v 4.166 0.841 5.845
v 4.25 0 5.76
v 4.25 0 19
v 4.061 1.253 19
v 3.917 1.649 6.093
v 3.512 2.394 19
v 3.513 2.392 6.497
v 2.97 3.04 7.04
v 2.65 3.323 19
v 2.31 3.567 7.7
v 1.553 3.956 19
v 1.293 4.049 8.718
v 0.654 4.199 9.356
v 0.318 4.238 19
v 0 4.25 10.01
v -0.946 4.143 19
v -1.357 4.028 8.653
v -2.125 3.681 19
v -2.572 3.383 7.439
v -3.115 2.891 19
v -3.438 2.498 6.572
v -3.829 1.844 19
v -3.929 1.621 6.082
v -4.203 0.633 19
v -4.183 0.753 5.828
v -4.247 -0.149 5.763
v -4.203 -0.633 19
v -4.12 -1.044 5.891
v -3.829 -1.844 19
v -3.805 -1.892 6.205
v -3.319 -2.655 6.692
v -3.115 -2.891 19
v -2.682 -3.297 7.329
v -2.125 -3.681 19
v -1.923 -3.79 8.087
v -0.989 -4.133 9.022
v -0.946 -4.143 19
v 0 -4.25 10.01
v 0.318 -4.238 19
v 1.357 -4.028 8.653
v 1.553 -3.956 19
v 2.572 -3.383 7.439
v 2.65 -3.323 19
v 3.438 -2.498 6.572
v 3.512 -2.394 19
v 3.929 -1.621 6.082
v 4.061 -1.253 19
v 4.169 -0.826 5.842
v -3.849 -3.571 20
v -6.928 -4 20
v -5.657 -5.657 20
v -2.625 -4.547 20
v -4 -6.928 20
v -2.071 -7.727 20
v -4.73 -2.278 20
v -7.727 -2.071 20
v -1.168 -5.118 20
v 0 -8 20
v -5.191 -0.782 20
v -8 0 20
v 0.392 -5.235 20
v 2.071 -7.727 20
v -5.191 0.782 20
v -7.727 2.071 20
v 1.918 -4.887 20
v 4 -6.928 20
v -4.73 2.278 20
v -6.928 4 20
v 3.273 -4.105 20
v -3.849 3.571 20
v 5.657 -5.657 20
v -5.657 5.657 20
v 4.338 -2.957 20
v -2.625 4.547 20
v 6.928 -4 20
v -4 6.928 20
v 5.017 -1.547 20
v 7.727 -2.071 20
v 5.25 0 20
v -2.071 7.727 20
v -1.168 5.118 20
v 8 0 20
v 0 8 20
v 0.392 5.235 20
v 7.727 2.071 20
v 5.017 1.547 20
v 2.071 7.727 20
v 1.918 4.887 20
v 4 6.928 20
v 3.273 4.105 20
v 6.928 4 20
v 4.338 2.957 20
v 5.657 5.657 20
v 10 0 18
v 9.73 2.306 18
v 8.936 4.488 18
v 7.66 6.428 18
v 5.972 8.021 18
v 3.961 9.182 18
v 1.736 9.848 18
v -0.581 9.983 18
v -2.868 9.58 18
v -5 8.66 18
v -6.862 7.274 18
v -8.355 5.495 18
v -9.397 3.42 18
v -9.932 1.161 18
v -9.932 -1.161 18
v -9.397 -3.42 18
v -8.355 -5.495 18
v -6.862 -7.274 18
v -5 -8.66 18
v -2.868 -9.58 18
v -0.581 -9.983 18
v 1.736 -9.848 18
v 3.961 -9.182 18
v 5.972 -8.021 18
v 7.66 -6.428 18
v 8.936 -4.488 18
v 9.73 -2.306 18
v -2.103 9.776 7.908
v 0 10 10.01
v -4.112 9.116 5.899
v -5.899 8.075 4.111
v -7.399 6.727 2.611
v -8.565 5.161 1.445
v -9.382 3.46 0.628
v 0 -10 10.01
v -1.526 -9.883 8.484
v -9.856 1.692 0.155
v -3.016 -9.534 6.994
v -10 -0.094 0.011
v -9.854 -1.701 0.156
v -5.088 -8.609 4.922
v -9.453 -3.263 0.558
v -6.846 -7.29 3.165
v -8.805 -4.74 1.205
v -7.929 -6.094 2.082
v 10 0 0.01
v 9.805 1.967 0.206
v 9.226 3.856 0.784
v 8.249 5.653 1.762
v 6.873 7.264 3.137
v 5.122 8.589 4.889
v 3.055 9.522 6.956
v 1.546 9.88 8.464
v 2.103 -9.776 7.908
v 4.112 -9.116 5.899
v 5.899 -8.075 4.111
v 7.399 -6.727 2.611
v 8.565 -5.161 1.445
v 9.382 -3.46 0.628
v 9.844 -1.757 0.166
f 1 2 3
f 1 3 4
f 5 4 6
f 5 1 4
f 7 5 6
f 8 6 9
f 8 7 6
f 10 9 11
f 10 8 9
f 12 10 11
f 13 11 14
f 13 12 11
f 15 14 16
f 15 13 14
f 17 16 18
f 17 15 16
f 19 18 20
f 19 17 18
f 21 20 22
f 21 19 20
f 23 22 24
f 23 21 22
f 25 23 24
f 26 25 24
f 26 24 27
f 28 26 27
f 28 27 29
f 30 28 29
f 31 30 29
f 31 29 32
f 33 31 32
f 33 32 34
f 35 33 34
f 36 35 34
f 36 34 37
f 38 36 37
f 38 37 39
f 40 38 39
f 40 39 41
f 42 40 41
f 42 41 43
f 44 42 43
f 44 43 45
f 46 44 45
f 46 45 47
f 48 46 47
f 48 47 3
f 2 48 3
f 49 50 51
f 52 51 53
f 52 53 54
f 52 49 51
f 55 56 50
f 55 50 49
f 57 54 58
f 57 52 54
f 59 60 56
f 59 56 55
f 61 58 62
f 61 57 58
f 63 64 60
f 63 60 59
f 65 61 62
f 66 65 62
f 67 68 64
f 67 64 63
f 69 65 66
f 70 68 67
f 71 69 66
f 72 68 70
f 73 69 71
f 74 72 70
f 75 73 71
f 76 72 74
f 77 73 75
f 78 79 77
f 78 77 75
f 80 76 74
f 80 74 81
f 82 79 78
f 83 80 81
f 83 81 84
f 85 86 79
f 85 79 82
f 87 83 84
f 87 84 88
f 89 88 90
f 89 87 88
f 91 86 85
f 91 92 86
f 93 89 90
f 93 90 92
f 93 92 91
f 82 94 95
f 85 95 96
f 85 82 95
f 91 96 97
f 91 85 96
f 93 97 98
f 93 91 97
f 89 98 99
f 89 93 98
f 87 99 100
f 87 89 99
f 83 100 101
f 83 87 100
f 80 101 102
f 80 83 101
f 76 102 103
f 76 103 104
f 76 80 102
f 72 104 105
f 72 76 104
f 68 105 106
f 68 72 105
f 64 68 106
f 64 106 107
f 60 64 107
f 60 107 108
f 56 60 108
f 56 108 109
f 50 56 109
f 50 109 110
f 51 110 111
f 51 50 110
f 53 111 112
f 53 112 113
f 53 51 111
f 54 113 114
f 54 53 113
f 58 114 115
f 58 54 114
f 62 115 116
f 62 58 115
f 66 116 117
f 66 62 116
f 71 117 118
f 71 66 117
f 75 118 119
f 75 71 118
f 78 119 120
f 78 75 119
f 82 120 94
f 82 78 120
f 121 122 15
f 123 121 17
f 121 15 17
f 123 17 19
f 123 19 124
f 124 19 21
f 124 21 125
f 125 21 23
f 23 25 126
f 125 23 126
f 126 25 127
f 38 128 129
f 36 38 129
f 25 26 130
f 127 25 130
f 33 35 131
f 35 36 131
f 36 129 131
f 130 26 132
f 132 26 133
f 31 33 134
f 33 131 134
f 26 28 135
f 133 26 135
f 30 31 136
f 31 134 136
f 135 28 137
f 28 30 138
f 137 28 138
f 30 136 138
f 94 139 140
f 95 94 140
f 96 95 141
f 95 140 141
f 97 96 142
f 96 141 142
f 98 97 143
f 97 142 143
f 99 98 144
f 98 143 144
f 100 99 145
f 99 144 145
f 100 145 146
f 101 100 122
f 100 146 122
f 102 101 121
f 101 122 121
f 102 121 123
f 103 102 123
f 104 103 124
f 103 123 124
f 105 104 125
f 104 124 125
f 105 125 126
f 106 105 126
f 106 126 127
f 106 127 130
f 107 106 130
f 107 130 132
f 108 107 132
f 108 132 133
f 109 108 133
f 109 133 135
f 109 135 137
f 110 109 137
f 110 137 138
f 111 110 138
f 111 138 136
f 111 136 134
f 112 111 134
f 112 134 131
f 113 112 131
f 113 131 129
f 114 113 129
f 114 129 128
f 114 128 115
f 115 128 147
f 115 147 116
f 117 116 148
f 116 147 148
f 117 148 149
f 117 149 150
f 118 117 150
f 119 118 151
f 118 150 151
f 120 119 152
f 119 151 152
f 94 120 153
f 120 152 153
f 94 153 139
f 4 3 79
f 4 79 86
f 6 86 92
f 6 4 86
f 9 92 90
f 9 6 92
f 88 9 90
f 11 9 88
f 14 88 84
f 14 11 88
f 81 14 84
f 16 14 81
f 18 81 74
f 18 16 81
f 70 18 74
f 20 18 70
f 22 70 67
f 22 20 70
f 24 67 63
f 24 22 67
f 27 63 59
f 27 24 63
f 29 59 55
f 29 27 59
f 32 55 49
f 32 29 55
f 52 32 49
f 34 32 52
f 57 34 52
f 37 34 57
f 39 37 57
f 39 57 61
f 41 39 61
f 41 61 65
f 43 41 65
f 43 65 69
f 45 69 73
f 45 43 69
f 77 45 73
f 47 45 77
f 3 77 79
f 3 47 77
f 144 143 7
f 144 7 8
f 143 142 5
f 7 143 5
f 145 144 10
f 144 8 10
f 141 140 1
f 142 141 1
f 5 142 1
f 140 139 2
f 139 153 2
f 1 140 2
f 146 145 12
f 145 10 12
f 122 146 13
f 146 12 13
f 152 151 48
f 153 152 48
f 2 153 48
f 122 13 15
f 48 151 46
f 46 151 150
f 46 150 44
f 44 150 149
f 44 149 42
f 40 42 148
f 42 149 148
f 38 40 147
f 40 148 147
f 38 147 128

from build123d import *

# Parameters (mm, degrees)
F0_R     = 10
F0_R_2   = 4.25
F1_DEPTH = 20
F3_DEPTH = 12.5
F4_SIZE  = 2
F5_SIZE  = 1


with BuildPart() as f1:
    # F0 (on Top) → F1 (new body)
    with BuildSketch(Plane.XY):
        Circle(F0_R)
        Circle(F0_R_2, mode=Mode.SUBTRACT)
    extrude(amount=F1_DEPTH)

    # F2 (on Front) → F3 (cut, symmetric)
    with BuildSketch(Plane.XZ):
        Polygon((0, 10.010473), (-10.010473, 0), (10.010473, 0), align=None)
    extrude(amount=F3_DEPTH, both=True, mode=Mode.SUBTRACT)

    # F4
    f4_edges = [f1.edges().sort_by_distance(p)[0] for p in [
        (-10, 0, 20),
    ]]
    chamfer(f4_edges, length=F4_SIZE)

    # F5
    f5_edges = [f1.edges().sort_by_distance(p)[0] for p in [
        (-4.25, 0, 20),
    ]]
    chamfer(f5_edges, length=F5_SIZE)


solid = f1.part
